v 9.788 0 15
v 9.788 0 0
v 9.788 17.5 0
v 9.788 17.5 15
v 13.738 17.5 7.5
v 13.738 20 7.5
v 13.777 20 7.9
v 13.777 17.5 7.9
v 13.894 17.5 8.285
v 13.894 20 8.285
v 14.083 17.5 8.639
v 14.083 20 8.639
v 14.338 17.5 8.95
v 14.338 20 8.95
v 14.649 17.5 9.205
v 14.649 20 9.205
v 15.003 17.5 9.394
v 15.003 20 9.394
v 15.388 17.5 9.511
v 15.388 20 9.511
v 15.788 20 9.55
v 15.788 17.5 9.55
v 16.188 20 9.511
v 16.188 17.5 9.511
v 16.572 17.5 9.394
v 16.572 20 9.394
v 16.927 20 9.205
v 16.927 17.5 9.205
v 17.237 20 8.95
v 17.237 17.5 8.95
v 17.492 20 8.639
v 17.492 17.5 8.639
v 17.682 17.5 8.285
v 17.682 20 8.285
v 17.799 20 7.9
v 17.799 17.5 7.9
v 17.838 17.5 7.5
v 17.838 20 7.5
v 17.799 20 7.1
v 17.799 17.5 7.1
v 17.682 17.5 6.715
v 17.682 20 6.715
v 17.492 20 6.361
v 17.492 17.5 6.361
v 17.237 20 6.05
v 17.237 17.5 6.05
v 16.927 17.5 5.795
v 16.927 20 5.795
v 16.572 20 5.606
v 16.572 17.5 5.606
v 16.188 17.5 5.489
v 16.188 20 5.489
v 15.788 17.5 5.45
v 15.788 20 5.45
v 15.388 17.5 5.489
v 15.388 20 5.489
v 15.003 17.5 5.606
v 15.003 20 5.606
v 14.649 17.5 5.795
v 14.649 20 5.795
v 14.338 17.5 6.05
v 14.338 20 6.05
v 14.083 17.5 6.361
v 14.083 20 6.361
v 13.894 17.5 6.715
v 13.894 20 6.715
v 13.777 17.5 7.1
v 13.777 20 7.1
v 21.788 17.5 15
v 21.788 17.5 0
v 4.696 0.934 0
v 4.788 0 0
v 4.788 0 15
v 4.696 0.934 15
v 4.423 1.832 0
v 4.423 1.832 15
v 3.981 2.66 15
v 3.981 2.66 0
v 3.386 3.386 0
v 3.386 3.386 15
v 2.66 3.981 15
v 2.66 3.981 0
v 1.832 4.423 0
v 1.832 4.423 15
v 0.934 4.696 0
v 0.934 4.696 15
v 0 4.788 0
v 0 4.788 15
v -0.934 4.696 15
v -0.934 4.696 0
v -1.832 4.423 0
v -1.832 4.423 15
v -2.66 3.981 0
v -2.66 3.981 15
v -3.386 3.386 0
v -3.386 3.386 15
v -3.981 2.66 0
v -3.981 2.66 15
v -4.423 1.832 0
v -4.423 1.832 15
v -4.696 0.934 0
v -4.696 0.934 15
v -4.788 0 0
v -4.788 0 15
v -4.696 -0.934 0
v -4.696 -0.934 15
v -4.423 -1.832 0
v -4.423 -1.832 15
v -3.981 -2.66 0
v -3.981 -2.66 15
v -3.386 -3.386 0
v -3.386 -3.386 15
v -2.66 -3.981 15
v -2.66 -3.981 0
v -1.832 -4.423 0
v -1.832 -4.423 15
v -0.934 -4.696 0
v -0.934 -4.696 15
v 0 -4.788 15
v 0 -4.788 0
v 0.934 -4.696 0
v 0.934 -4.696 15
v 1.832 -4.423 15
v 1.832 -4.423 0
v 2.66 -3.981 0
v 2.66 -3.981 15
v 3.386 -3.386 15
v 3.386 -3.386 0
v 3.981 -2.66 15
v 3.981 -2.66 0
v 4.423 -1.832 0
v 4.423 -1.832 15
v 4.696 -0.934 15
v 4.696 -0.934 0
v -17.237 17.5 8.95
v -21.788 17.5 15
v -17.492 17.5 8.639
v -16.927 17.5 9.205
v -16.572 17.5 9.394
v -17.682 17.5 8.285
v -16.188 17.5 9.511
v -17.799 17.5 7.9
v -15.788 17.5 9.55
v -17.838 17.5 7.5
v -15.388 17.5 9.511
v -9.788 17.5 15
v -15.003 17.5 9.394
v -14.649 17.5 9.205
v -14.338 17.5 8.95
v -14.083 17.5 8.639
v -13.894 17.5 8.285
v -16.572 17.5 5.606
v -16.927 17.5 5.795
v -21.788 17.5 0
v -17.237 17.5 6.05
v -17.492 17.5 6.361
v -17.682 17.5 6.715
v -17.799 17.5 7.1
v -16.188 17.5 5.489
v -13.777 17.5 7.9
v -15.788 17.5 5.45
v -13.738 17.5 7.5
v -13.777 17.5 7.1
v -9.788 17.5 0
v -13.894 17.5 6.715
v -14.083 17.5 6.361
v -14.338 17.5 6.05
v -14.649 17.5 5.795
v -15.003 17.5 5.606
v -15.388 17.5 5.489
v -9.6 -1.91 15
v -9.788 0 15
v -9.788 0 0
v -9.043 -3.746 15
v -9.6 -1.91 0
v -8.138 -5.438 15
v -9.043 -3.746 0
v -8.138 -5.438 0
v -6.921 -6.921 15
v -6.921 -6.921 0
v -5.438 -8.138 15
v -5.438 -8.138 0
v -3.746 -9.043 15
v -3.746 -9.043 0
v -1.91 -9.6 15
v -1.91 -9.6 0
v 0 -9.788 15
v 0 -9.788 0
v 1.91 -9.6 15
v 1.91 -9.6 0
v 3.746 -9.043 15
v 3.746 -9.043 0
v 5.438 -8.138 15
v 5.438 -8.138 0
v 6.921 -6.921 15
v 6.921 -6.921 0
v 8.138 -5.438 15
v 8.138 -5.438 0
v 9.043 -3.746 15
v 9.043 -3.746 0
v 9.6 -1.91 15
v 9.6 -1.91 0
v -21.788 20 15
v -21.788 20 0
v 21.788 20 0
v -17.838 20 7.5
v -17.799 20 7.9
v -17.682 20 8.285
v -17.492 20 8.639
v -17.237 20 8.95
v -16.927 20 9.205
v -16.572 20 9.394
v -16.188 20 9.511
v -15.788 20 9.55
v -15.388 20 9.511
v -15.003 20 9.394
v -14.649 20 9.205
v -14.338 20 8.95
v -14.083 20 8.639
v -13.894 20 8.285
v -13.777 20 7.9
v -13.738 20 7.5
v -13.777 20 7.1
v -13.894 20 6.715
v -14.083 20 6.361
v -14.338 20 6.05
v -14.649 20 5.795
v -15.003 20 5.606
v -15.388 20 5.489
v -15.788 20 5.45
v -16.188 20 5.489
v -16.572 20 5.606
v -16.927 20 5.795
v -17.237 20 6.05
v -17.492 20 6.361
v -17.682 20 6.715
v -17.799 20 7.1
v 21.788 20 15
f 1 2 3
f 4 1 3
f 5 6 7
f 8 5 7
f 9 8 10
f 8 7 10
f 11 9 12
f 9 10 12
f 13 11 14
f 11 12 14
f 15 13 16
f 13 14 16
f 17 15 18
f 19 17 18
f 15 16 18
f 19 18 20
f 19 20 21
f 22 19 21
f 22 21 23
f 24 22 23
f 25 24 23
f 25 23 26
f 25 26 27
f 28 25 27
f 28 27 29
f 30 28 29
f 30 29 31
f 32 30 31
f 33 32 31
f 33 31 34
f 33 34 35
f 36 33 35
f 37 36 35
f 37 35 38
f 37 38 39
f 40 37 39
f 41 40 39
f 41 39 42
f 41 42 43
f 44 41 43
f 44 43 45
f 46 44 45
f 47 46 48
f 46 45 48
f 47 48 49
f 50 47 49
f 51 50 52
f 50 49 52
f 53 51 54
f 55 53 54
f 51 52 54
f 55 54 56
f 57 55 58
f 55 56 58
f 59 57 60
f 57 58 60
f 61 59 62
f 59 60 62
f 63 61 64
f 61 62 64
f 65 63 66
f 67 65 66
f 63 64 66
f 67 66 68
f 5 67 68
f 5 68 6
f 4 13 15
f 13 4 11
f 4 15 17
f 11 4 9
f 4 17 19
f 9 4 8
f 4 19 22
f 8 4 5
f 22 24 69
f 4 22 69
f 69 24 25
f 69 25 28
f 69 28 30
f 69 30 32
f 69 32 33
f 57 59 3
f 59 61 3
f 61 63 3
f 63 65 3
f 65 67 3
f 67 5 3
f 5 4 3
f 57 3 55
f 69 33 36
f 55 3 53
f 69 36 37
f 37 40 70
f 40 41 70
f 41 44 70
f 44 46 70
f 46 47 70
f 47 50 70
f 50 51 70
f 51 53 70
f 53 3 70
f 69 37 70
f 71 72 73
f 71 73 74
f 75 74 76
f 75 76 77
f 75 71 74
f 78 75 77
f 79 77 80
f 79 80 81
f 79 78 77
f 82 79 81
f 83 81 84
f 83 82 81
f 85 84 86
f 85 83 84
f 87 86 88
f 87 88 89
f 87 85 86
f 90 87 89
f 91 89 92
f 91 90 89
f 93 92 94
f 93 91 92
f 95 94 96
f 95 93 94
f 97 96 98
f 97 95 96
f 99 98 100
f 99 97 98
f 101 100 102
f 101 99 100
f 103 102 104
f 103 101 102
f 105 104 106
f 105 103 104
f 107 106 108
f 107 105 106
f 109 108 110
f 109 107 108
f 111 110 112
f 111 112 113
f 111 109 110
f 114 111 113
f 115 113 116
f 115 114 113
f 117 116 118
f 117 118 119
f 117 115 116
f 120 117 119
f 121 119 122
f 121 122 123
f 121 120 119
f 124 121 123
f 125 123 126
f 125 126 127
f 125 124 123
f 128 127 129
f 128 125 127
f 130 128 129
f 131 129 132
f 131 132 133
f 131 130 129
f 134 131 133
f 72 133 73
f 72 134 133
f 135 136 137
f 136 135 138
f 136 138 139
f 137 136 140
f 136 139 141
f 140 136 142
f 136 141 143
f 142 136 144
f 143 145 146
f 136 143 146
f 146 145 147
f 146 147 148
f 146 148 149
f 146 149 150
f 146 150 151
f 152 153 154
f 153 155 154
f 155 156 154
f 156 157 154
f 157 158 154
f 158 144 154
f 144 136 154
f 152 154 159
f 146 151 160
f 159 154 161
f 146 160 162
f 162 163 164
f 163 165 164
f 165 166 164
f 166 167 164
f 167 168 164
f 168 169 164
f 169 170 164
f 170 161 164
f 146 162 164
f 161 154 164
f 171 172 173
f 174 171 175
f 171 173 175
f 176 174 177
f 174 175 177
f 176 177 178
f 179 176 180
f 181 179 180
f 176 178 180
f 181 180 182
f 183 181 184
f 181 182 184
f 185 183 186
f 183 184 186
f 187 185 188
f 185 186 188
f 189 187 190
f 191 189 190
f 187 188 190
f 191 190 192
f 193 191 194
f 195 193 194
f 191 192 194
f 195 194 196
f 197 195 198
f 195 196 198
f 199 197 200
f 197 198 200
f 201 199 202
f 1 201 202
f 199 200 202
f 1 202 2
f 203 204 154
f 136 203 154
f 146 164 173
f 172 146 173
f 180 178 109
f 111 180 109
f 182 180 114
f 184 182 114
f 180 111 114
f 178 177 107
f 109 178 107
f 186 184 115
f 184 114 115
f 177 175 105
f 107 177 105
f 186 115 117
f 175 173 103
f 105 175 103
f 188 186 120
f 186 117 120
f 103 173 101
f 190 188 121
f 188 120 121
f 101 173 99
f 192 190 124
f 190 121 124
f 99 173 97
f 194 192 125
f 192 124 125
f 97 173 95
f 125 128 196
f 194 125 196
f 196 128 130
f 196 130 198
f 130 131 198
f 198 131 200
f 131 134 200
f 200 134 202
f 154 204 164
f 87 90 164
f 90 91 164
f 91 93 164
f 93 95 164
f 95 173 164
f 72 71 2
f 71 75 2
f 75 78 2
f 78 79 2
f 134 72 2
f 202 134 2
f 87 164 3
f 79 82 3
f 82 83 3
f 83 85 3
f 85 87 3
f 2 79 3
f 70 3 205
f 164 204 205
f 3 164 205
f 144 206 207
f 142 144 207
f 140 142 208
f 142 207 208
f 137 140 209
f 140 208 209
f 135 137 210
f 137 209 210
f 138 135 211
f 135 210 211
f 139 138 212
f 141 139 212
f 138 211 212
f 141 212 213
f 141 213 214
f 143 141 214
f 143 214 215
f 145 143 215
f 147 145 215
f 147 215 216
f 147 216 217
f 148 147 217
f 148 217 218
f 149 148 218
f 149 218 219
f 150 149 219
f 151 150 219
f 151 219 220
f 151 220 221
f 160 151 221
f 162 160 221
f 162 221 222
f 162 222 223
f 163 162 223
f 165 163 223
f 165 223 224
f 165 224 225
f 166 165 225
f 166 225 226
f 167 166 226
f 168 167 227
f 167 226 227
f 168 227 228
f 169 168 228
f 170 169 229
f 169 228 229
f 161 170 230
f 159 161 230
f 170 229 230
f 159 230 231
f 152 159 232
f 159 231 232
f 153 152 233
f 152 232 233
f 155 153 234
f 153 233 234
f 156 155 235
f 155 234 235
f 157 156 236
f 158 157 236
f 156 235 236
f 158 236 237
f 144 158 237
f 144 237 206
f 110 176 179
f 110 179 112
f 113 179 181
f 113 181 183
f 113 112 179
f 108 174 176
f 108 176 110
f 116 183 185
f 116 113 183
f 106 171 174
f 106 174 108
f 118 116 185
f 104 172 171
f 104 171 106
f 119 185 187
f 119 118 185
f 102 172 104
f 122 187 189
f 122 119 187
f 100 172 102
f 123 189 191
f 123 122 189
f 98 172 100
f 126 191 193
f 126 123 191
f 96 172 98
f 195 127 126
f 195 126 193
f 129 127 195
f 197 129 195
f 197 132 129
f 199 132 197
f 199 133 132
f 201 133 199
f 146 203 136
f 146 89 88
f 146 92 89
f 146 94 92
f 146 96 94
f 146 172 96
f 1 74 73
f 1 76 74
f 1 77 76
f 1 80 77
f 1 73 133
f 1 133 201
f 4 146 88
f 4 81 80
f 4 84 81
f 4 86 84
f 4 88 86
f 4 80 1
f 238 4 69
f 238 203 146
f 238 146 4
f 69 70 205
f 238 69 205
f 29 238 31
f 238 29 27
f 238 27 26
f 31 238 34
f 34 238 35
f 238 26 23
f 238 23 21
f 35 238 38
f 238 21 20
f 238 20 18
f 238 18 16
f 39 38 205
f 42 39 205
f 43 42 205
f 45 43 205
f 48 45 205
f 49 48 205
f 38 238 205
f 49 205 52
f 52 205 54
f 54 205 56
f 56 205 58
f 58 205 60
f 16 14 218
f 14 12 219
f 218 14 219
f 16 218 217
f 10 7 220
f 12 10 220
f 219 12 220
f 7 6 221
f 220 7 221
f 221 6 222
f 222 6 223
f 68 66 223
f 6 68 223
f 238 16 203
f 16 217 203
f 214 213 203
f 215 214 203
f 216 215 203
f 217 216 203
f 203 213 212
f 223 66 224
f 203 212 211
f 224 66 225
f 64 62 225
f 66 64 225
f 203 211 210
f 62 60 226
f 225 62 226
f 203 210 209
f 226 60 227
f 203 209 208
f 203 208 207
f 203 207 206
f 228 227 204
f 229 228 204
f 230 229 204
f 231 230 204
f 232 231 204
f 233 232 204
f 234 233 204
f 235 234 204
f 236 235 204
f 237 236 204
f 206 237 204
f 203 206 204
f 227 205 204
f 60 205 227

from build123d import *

# Parameters (mm, degrees)
F0_R     = 4.7879
F1_DEPTH = 15
F4_D     = 4.1
F5_D     = 4.1


with BuildPart() as f1:
    # F0 (on Top) → F1 (new body)
    with BuildSketch(Plane.XY):
        with BuildLine():
            ThreePointArc((-9.7879, 0), (0, 9.7879), (9.7879, 0))
            Line((9.7879, 0), (9.7879, 17.5))
            Line((9.7879, 17.5), (21.7879, 17.5))
            Line((21.7879, 17.5), (21.7879, 20))
            Line((21.7879, 20), (0, 20))
            Line((0, 20), (-21.7879, 20))
            Line((-21.7879, 20), (-21.7879, 17.5))
            Line((-21.7879, 17.5), (-9.7879, 17.5))
            Line((-9.7879, 17.5), (-9.7879, 0))
        make_face()
        with BuildLine():
            ThreePointArc((-9.7879, 0), (0, -9.7879), (9.7879, 0))
            ThreePointArc((9.7879, 0), (0, 9.7879), (-9.7879, 0))
        make_face()
        Circle(F0_R, mode=Mode.SUBTRACT)
    extrude(amount=F1_DEPTH)

    # F4 (through all)
    with Locations(Plane.XZ.offset(-17.5)):
        with Locations((15.7879, 7.5)):
            Hole(F4_D / 2)

    # F5 (through all)
    with Locations(Plane.XZ.offset(-17.5)):
        with Locations((-15.7879, 7.5)):
            Hole(F5_D / 2)


solid = f1.part
